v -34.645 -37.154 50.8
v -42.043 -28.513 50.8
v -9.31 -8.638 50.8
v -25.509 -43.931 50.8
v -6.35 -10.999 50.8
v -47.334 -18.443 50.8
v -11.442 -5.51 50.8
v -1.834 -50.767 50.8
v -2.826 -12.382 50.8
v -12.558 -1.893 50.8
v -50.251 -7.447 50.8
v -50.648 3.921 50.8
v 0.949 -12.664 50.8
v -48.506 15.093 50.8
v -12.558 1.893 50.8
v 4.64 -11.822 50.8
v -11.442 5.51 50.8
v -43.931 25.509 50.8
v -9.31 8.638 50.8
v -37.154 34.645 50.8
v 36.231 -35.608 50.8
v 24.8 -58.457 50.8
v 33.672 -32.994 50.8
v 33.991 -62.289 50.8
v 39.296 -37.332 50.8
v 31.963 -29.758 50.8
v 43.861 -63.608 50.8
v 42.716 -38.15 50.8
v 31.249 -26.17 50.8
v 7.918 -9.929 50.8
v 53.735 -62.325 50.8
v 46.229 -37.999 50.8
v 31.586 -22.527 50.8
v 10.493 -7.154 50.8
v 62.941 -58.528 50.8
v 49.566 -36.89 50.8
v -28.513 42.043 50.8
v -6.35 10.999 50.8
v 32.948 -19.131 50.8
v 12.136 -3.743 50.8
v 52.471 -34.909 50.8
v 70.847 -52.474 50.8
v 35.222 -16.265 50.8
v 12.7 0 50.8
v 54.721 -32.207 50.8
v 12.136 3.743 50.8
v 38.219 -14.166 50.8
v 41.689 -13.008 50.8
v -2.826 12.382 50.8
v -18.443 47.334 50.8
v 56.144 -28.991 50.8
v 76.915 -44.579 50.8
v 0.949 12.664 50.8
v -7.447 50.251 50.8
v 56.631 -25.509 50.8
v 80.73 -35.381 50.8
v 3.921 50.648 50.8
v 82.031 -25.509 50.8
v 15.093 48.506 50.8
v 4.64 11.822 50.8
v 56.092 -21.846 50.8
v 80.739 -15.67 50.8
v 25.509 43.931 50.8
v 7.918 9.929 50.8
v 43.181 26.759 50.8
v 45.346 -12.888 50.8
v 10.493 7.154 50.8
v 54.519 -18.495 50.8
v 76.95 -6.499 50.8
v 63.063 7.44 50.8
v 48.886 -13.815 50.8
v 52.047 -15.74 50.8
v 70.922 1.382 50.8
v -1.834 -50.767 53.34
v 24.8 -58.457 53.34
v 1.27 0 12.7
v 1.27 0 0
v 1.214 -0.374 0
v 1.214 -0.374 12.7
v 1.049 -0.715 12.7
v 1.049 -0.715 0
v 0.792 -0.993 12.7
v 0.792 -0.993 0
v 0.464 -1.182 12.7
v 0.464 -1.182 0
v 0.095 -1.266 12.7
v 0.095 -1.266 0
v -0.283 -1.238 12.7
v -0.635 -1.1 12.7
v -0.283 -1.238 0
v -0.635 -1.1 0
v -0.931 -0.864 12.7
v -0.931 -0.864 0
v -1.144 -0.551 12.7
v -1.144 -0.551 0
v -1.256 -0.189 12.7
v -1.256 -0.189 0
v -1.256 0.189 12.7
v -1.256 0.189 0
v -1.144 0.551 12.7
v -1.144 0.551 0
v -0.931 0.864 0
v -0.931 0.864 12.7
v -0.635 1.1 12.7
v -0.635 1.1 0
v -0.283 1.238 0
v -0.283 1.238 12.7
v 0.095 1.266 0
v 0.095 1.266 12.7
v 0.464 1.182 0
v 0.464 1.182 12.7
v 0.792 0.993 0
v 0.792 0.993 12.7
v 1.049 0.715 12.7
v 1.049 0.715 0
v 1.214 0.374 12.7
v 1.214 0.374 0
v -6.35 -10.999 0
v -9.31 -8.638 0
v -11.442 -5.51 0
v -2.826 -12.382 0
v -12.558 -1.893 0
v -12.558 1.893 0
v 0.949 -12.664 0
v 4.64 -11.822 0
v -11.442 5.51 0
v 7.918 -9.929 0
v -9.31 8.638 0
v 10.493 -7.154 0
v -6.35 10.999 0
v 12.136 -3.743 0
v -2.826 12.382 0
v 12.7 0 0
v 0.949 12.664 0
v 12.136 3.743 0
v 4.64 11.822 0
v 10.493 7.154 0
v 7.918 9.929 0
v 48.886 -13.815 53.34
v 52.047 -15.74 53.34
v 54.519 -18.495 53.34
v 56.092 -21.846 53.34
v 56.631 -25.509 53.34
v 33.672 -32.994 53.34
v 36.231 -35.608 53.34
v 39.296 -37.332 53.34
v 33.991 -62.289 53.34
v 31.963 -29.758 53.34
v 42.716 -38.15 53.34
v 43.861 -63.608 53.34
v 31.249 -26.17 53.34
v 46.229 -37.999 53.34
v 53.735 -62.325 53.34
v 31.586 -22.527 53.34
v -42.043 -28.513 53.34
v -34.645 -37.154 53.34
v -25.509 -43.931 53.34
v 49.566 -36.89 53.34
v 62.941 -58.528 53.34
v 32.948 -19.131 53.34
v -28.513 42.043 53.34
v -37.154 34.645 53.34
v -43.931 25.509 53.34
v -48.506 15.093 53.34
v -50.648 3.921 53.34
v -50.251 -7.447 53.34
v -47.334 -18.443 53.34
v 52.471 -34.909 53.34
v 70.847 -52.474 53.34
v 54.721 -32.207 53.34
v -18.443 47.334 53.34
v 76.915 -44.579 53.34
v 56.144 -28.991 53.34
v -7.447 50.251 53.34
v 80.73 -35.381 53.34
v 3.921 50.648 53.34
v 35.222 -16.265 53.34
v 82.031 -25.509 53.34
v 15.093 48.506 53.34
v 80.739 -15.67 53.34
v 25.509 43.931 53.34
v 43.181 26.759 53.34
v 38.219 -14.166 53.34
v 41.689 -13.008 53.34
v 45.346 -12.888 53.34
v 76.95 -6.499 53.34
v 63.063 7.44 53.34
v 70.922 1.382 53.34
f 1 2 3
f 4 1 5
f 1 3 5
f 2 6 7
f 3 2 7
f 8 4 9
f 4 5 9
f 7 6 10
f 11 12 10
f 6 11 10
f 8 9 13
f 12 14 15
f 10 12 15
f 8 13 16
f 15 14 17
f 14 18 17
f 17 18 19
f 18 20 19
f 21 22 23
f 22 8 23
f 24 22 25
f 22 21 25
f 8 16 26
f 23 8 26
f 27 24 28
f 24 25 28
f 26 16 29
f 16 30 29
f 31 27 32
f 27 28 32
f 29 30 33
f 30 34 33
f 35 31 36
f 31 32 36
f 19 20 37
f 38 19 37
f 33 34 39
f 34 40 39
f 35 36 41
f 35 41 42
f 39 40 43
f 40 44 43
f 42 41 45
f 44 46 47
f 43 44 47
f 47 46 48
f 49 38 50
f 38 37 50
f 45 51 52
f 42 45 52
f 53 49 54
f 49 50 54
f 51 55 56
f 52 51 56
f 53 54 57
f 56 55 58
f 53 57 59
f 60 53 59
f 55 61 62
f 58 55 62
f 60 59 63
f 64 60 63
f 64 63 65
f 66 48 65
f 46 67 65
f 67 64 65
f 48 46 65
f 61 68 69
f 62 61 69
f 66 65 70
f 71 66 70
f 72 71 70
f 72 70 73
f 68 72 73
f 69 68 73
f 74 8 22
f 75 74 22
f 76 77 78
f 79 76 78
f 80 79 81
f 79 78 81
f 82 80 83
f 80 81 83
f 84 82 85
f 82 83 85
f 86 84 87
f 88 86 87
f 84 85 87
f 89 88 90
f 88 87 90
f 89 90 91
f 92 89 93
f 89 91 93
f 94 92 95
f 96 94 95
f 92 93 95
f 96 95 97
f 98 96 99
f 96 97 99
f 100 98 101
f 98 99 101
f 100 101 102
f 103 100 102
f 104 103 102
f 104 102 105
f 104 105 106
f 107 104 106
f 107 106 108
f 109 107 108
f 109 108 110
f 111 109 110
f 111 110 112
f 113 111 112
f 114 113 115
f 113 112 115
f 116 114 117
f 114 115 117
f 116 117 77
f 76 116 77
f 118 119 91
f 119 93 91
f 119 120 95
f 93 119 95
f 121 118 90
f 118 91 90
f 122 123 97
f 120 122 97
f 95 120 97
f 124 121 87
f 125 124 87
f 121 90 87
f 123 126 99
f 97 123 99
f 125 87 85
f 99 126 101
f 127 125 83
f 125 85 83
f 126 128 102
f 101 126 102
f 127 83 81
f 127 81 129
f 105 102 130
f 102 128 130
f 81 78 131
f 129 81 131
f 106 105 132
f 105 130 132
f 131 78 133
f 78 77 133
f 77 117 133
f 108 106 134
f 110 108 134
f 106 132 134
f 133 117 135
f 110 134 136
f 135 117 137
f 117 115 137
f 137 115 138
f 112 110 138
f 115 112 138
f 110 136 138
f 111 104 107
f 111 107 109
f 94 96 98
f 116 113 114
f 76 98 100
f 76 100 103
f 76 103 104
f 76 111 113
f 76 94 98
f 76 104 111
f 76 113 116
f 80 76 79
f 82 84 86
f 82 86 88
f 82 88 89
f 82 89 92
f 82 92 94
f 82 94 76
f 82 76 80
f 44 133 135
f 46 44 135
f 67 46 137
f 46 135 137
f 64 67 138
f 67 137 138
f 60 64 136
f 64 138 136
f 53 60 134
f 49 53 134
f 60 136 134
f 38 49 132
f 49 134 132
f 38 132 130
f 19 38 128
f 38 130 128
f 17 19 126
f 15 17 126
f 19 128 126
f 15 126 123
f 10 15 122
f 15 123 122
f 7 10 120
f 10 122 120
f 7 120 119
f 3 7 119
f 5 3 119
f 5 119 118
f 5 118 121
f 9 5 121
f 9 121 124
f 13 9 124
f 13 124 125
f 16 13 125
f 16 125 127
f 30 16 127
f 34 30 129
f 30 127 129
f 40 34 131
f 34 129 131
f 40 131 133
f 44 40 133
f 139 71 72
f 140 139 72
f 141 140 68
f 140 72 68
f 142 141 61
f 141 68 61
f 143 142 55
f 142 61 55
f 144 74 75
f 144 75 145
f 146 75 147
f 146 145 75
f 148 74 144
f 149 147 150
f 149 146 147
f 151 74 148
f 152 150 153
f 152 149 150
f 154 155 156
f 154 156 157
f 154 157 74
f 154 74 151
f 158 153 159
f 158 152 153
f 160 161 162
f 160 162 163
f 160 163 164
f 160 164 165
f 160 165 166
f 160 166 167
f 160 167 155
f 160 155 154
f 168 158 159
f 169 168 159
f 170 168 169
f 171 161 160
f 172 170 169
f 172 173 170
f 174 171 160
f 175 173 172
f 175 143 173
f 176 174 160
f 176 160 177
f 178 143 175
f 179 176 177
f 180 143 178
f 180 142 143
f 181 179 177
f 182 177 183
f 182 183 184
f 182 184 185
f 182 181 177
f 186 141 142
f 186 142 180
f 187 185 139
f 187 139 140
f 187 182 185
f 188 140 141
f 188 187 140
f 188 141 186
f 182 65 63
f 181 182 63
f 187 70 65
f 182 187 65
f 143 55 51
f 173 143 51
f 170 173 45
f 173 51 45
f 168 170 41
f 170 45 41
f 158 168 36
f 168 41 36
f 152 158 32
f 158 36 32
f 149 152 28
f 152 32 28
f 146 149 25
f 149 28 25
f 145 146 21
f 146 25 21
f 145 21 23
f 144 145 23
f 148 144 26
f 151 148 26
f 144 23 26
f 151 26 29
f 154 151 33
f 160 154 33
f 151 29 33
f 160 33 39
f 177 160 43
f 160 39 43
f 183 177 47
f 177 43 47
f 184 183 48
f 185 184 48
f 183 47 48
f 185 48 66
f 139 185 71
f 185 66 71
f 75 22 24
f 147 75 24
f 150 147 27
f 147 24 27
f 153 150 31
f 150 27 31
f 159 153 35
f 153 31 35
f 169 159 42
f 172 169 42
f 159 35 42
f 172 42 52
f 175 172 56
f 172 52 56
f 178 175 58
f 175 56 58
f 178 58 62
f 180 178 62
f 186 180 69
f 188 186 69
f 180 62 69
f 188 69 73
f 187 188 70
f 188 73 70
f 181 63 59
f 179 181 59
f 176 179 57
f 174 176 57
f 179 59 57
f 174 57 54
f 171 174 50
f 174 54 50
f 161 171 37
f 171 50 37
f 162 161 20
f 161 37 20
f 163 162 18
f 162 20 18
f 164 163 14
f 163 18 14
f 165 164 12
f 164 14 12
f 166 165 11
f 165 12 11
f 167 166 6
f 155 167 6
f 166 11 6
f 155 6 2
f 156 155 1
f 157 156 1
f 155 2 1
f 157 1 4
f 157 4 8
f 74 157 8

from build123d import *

# Parameters (mm, degrees)
F0_R     = 12.7
F1_DEPTH = 50.8
F3_DEPTH = 2.54
F4_R     = 1.27
F5_DEPTH = 12.7


with BuildPart() as f1:
    # F0 (on Top) → F1 (new body)
    with BuildSketch(Plane.XY):
        Circle(F0_R)
    extrude(amount=F1_DEPTH)

    # F2 (on face) → F3 (join)
    with BuildSketch(Plane.XY.offset(50.8)):
        with BuildLine():
            Line((43.181052426, 26.7588622961), (25.5085228248, 43.9312561088))
            ThreePointArc((25.5085228248, 43.9312561088), (-43.9312561088, 25.5085228248), (-25.5085228248, -43.9312561088))
            Line((-25.5085228248, -43.9312561088), (-1.833987853, -50.7668837783))
            ThreePointArc((-1.833987853, -50.7668837783), (6.0769799698, -50.4352090751), (13.8403151675, -48.87827407))
            ThreePointArc((13.8403151675, -48.87827407), (5.917077838, -28.064349578), (10.982813992, -6.3771307669))
            ThreePointArc((10.982813992, -6.3771307669), (27.3066244447, 8.7731285653), (49.3108654889, 12.2097725094))
            ThreePointArc((49.3108654889, 12.2097725094), (46.8146101479, 19.7239011532), (43.181052426, 26.7588622961))
        make_face()
        with BuildLine():
            ThreePointArc((12.7, 0), (12.2631916257, -3.3021403894), (10.982813992, -6.3771307669))
            ThreePointArc((10.982813992, -6.3771307669), (-12.2631916257, 3.3021403894), (12.7, 0))
        make_face(mode=Mode.SUBTRACT)
        with BuildLine():
            ThreePointArc((63.0626482274, 7.4399192569), (56.4166545258, 10.4876551164), (49.3108654889, 12.2097725094))
            ThreePointArc((49.3108654889, 12.2097725094), (50.4263421578, 6.150123298), (50.8, 0))
            ThreePointArc((50.8, 0), (50.3191031963, -6.9733674448), (48.8855175779, -13.8147085071))
            ThreePointArc((48.8855175779, -13.8147085071), (54.5192002119, -18.4952896423), (56.6312561088, -25.5085228248))
            ThreePointArc((56.6312561088, -25.5085228248), (49.5659896786, -36.8900770946), (36.2312911329, -35.6080544659))
            ThreePointArc((36.2312911329, -35.6080544659), (25.9001181747, -43.7015317642), (13.8403151675, -48.87827407))
            ThreePointArc((13.8403151675, -48.87827407), (18.8584152746, -54.1958484669), (24.7998639903, -58.4569649064))
            ThreePointArc((24.7998639903, -58.4569649064), (62.9405164874, -58.5275782301), (82.0312561088, -25.5085228248))
            ThreePointArc((82.0312561088, -25.5085228248), (76.9503115141, -6.4992624462), (63.0626482274, 7.4399192569))
        make_face()
        with BuildLine():
            ThreePointArc((50.8, 0), (50.4263421578, 6.150123298), (49.3108654889, 12.2097725094))
            ThreePointArc((49.3108654889, 12.2097725094), (27.3066244447, 8.7731285653), (10.982813992, -6.3771307669))
            ThreePointArc((10.982813992, -6.3771307669), (5.917077838, -28.064349578), (13.8403151675, -48.87827407))
            ThreePointArc((13.8403151675, -48.87827407), (25.9001181747, -43.7015317642), (36.2312911329, -35.6080544659))
            ThreePointArc((36.2312911329, -35.6080544659), (32.9484420816, -19.1313921186), (48.8855175779, -13.8147085071))
            ThreePointArc((48.8855175779, -13.8147085071), (50.3191031963, -6.9733674448), (50.8, 0))
        make_face()
        with BuildLine():
            ThreePointArc((12.7, 0), (-12.2631916257, 3.3021403894), (10.982813992, -6.3771307669))
            ThreePointArc((10.982813992, -6.3771307669), (12.2631916257, -3.3021403894), (12.7, 0))
        make_face()
        with BuildLine():
            Line((63.0626482274, 7.4399192569), (43.181052426, 26.7588622961))
            ThreePointArc((43.181052426, 26.7588622961), (46.8146101479, 19.7239011532), (49.3108654889, 12.2097725094))
            ThreePointArc((49.3108654889, 12.2097725094), (56.4166545258, 10.4876551164), (63.0626482274, 7.4399192569))
        make_face()
        with BuildLine():
            ThreePointArc((13.8403151675, -48.87827407), (6.0769799698, -50.4352090751), (-1.833987853, -50.7668837783))
            Line((-1.833987853, -50.7668837783), (24.7998639903, -58.4569649064))
            ThreePointArc((24.7998639903, -58.4569649064), (18.8584152746, -54.1958484669), (13.8403151675, -48.87827407))
        make_face()
    extrude(amount=F3_DEPTH)

    # F4 (on face) → F5 (cut)
    with BuildSketch(Plane(origin=(0, 0, 0), x_dir=(1, 0, 0), z_dir=(0, 0, -1))):
        Circle(F4_R)
    extrude(amount=-F5_DEPTH, mode=Mode.SUBTRACT)


solid = f1.part
